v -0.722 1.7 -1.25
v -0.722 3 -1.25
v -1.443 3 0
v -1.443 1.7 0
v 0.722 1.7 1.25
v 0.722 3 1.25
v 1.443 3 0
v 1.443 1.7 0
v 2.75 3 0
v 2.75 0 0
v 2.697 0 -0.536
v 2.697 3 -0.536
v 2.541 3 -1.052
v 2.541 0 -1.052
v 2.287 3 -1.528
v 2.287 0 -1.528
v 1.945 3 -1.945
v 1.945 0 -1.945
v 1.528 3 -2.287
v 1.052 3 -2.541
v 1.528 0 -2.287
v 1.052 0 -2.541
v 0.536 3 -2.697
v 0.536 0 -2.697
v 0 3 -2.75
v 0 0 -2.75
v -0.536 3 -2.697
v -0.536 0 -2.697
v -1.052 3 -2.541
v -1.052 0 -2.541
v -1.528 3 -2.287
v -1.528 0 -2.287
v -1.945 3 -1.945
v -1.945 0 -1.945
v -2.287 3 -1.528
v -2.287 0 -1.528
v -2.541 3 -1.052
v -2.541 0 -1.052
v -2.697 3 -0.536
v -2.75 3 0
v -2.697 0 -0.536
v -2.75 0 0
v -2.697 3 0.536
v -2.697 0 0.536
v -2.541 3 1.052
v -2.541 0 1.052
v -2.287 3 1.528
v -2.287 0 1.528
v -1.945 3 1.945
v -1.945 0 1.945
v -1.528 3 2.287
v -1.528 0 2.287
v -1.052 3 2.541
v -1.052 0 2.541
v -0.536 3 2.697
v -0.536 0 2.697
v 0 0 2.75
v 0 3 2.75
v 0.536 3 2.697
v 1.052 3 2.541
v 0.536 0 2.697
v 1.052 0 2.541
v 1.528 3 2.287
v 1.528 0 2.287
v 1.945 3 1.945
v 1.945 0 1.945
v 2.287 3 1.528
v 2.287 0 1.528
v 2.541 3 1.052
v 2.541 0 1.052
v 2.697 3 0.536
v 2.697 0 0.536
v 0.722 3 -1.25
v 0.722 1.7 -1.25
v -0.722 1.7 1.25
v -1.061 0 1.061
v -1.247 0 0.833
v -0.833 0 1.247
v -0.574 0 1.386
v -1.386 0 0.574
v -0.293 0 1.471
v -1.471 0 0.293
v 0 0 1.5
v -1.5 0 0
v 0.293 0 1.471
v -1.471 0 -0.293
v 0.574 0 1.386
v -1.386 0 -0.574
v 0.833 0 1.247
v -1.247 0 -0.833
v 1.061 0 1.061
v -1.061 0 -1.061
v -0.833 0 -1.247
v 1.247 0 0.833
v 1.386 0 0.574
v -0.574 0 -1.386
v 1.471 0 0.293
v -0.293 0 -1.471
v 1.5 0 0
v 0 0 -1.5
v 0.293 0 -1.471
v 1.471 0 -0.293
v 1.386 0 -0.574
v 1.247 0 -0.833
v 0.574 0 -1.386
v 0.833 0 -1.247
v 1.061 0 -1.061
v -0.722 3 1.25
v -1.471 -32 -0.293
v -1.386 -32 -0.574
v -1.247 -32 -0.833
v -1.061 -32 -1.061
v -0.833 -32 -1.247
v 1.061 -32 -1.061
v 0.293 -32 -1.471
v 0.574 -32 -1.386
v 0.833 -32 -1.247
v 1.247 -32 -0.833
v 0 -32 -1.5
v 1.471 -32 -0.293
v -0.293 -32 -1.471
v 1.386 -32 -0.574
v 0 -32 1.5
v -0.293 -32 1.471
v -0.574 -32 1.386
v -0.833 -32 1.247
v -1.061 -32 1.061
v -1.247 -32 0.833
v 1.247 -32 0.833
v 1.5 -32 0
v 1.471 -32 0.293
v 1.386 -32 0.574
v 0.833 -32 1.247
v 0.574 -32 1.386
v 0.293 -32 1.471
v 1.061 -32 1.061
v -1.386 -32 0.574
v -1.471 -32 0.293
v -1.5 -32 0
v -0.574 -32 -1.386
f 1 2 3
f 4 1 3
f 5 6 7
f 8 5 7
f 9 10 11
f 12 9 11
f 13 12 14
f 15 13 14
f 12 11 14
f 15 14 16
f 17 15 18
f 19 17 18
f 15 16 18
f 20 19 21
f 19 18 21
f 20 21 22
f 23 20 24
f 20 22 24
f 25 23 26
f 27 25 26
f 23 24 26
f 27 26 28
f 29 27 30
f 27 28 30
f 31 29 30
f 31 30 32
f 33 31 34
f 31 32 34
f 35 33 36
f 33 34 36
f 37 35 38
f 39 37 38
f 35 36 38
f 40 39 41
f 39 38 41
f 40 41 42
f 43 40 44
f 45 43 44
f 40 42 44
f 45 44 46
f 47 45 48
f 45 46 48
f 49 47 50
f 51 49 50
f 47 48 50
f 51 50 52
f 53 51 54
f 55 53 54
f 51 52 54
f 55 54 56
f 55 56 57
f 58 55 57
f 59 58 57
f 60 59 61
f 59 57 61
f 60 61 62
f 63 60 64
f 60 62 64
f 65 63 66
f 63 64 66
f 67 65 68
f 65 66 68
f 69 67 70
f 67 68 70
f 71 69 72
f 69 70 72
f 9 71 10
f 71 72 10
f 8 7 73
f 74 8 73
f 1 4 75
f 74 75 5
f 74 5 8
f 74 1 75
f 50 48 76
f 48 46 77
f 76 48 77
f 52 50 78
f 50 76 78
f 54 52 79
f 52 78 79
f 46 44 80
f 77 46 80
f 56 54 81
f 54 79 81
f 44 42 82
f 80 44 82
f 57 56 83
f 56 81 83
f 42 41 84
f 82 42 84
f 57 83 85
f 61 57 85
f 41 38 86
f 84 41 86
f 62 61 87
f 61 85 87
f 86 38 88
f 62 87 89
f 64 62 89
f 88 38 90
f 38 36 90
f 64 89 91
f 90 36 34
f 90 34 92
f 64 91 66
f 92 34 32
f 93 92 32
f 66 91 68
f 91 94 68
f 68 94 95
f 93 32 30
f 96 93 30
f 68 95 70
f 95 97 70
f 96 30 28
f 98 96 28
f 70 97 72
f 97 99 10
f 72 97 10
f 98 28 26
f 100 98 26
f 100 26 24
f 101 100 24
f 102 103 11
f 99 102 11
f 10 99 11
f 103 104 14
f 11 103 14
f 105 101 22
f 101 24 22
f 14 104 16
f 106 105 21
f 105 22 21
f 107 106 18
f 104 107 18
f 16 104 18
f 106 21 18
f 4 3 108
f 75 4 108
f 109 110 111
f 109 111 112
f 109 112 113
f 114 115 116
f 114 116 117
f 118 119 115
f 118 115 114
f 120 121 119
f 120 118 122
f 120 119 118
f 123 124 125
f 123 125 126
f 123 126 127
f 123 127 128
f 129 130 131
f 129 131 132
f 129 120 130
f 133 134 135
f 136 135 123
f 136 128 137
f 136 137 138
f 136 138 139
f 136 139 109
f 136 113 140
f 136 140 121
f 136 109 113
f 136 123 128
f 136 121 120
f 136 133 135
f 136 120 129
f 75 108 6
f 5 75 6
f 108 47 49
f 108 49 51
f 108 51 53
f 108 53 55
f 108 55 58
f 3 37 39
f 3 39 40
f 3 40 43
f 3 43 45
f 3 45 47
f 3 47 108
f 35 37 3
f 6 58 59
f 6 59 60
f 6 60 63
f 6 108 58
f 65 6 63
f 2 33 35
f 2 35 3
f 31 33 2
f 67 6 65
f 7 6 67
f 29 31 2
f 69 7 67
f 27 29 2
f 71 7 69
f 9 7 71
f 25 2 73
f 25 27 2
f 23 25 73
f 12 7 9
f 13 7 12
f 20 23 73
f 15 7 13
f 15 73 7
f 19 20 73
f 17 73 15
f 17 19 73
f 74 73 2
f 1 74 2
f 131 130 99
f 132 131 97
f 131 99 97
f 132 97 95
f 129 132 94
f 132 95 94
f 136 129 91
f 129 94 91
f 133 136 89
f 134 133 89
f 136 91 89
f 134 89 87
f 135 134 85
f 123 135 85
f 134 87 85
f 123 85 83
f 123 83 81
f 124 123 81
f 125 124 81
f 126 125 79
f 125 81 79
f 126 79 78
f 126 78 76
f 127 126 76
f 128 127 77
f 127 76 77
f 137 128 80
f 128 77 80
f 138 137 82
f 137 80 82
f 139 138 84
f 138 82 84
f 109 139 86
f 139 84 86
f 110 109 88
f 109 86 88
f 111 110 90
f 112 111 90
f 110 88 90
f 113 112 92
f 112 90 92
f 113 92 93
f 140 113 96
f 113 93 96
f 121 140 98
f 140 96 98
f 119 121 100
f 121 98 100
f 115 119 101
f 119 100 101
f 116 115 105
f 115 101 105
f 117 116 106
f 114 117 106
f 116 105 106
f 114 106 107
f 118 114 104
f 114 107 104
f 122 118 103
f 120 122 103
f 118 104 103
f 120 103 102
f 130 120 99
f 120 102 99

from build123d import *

# Parameters (mm, degrees)
SKETCH_1_R            = 2.75
EXTRUDE_248_DEPTH     = 3
CUT_EXTRUDE_378_DEPTH = 1.3
SKETCH_3_R            = 1.5
EXTRUDE_479_DEPTH     = 32


with BuildPart() as part:
    # 草图1 → Extrude 248 (new body)
    with BuildSketch(Plane(origin=(0, 0, 0), x_dir=(1, 0, 0), z_dir=(0, 1, 0))):
        Circle(SKETCH_1_R)
    extrude(amount=EXTRUDE_248_DEPTH)

    # 草图2 → Cut-Extrude 378 (cut)
    with BuildSketch(Plane(origin=(0, 3, 0), x_dir=(1, 0, 0), z_dir=(0, 1, 0))):
        Polygon((1.443375673, 0), (0.721687836, 1.25), (-0.721687836, 1.25), (-1.443375673, 0), (-0.721687836, -1.25), (0.721687836, -1.25), align=None)
    extrude(amount=-CUT_EXTRUDE_378_DEPTH, mode=Mode.SUBTRACT)

    # 草图3 → Extrude 479 (add)
    with BuildSketch(Plane.XZ):
        Circle(SKETCH_3_R)
    extrude(amount=EXTRUDE_479_DEPTH)


solid = part.part
